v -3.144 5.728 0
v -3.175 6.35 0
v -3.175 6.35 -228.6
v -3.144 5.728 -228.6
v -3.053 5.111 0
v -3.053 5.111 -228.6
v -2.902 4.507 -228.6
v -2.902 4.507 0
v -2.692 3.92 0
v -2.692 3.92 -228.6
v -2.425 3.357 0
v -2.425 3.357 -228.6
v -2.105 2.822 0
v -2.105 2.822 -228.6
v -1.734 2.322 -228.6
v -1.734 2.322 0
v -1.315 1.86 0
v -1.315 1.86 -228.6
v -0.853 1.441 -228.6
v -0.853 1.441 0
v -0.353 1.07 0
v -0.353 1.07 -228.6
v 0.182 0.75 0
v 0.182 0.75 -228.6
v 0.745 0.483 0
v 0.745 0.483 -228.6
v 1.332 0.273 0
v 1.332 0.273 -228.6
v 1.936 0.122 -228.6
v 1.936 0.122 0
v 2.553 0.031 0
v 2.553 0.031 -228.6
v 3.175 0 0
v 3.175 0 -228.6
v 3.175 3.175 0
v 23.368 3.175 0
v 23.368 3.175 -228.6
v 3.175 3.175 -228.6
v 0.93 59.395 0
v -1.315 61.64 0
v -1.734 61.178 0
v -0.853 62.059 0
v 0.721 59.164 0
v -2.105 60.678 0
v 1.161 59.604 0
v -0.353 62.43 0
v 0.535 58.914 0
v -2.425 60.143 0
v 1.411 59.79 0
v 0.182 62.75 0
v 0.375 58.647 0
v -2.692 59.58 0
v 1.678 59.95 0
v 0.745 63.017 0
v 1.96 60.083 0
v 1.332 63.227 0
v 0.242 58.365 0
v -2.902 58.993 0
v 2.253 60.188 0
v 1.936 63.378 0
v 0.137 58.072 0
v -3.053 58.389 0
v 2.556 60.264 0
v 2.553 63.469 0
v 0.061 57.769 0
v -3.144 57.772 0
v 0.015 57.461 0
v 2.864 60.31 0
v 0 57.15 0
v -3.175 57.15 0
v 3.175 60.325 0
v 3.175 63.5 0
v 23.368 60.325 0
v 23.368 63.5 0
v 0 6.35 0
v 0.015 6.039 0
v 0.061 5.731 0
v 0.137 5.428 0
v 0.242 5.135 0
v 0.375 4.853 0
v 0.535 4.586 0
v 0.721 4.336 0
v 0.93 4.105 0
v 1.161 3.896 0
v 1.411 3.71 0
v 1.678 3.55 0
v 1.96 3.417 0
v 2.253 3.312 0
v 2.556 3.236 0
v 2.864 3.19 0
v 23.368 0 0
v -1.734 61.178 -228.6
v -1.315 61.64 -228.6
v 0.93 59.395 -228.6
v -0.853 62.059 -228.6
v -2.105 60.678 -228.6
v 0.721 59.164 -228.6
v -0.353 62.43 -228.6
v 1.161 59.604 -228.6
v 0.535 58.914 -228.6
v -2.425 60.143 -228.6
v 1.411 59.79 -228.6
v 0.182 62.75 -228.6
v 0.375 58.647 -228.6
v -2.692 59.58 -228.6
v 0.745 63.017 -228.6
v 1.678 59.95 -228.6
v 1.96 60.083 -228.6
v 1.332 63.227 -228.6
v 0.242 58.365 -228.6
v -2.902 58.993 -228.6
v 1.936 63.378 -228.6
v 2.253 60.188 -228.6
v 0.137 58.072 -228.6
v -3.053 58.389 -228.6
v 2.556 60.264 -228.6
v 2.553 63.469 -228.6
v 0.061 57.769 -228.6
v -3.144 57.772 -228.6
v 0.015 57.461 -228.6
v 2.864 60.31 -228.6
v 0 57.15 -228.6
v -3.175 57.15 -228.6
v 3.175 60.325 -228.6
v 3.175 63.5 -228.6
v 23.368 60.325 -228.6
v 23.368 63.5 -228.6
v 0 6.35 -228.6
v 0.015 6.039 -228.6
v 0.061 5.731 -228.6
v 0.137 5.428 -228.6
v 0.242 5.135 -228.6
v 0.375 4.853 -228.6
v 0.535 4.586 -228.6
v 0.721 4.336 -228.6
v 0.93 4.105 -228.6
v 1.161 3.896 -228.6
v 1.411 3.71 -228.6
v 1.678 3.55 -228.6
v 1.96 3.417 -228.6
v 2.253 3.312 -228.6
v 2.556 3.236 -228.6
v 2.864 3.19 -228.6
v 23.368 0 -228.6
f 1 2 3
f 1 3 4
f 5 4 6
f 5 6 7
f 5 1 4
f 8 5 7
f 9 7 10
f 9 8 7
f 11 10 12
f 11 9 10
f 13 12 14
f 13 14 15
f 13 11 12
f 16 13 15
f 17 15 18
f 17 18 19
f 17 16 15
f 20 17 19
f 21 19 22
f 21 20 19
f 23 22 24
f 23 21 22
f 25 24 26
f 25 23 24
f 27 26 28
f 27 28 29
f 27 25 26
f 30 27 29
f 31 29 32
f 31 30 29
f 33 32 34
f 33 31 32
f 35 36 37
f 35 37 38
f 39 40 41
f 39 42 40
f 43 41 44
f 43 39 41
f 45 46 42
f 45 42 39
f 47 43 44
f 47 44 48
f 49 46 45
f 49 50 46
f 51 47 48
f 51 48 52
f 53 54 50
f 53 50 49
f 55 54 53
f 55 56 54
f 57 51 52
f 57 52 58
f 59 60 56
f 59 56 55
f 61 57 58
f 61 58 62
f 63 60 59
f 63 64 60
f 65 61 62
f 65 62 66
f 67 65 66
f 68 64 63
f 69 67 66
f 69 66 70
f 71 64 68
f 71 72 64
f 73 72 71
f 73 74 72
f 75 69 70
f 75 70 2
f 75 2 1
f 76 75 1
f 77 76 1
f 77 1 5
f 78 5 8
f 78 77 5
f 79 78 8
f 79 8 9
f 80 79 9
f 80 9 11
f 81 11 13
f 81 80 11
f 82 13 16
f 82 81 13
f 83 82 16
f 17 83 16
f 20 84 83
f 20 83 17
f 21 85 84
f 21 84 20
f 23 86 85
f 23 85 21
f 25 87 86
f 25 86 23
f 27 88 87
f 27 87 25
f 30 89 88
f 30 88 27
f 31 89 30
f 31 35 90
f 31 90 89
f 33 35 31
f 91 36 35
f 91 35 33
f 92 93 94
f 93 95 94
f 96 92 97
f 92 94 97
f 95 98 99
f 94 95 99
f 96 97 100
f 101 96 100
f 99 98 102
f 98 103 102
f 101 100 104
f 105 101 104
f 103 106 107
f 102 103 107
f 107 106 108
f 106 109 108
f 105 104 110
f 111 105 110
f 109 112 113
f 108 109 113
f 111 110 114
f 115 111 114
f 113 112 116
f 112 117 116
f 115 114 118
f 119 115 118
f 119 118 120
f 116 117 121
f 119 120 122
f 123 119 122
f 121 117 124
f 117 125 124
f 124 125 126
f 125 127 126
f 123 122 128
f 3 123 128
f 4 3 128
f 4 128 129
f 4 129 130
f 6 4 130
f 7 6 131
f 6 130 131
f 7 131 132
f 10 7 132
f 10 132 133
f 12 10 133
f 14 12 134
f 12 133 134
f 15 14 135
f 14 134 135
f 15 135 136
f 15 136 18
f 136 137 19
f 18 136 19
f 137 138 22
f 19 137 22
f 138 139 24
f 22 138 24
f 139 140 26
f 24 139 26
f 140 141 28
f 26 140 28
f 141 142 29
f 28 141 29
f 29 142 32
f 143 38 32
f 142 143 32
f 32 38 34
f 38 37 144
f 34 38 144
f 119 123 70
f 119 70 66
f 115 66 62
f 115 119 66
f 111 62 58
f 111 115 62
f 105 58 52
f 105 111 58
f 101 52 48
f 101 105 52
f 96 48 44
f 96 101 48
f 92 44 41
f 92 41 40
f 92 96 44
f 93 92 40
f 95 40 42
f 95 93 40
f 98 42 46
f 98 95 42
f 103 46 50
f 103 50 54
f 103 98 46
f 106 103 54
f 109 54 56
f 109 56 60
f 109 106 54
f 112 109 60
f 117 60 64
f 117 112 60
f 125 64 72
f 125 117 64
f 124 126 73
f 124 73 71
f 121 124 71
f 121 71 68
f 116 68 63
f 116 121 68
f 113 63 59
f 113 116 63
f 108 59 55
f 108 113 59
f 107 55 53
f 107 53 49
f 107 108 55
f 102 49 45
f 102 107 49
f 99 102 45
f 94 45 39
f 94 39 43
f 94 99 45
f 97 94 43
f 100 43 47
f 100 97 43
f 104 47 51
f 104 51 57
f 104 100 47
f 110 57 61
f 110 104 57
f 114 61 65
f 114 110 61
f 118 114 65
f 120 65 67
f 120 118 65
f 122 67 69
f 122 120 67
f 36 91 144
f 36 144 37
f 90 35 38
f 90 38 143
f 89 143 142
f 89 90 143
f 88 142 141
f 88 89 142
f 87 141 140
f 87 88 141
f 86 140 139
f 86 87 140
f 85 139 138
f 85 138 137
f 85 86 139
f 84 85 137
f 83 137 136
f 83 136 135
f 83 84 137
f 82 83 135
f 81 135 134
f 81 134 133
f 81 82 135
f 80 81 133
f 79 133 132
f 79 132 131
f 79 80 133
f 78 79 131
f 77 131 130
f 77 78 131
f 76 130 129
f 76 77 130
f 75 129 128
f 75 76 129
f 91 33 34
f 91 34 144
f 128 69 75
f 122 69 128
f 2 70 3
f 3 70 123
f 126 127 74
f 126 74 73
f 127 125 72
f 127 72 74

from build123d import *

# Parameters (mm, degrees)
SKETCH1_W                      = 228.6
SKETCH1_H                      = 63.5
BASE_FLANGE1_DEPTH             = 3.175
EDGE_FLANGE1_STRIP_W           = 19.05
EDGE_FLANGE1_STRIP_H           = 3.175
EDGE_FLANGE1_STRIP_CUT_DEPTH   = 228.6
EDGE_FLANGE1_STRIP_2_W         = 19.05
EDGE_FLANGE1_STRIP_2_H         = 3.175
EDGE_FLANGE1_STRIP_CUT_2_DEPTH = 228.6
EDGE_FLANGE1_DEPTH             = 228.6
EDGE_FLANGE1_BEND_DEPTH        = 228.6


# Sheet-metal steps are written as plain solids
with BuildPart() as part:
    # Sketch1 → Base-Flange1 (new body)
    with BuildSketch(Plane(origin=(0, 0, 0), x_dir=(0, 0, -1), z_dir=(1, 0, 0))):
        with Locations((114.3, 31.75)):
            Rectangle(SKETCH1_W, SKETCH1_H)
    extrude(amount=-BASE_FLANGE1_DEPTH)

    # Edge-Flange1 strip (across the edge) → Edge-Flange1 strip cut (cut)
    with BuildSketch(Plane(origin=(0, 63.5, -228.6), x_dir=(0, -1, 0), z_dir=(0, 0, 1))):
        with Locations((-3.175, -1.5875)):
            Rectangle(EDGE_FLANGE1_STRIP_W, EDGE_FLANGE1_STRIP_H)
    extrude(amount=EDGE_FLANGE1_STRIP_CUT_DEPTH, mode=Mode.SUBTRACT)

    # Edge-Flange1 strip 2 (across the edge) → Edge-Flange1 strip cut 2 (cut)
    with BuildSketch(Plane.YX):
        with Locations((-3.175, -1.5875)):
            Rectangle(EDGE_FLANGE1_STRIP_2_W, EDGE_FLANGE1_STRIP_2_H)
    extrude(amount=EDGE_FLANGE1_STRIP_CUT_2_DEPTH, mode=Mode.SUBTRACT)

    # Edge-Flange1 section (across the edge) → Edge-Flange1 (add)
    with BuildSketch(Plane(origin=(0, 63.5, -228.6), x_dir=(0, -1, 0), z_dir=(0, 0, 1))):
        with BuildLine():
            Line((0, 3.175), (0, 23.368))
            Line((0, 23.368), (3.175, 23.368))
            Line((3.175, 23.368), (3.175, 3.175))
            ThreePointArc((3.175, 3.175), (4.10493597, 0.92993597), (6.35, 0))
            Line((6.35, 0), (6.35, -3.175))
            ThreePointArc((6.35, -3.175), (1.859871939, -1.315128061), (0, 3.175))
        make_face()
    extrude(amount=EDGE_FLANGE1_DEPTH)

    # Edge-Flange1 section 2 (across the edge) → Edge-Flange1 bend (add)
    with BuildSketch(Plane.YX):
        with BuildLine():
            Line((0, 3.175), (0, 23.368))
            Line((0, 23.368), (3.175, 23.368))
            Line((3.175, 23.368), (3.175, 3.175))
            ThreePointArc((3.175, 3.175), (4.10493597, 0.92993597), (6.35, 0))
            Line((6.35, 0), (6.35, -3.175))
            ThreePointArc((6.35, -3.175), (1.859871939, -1.315128061), (0, 3.175))
        make_face()
    extrude(amount=EDGE_FLANGE1_BEND_DEPTH)


solid = part.part
